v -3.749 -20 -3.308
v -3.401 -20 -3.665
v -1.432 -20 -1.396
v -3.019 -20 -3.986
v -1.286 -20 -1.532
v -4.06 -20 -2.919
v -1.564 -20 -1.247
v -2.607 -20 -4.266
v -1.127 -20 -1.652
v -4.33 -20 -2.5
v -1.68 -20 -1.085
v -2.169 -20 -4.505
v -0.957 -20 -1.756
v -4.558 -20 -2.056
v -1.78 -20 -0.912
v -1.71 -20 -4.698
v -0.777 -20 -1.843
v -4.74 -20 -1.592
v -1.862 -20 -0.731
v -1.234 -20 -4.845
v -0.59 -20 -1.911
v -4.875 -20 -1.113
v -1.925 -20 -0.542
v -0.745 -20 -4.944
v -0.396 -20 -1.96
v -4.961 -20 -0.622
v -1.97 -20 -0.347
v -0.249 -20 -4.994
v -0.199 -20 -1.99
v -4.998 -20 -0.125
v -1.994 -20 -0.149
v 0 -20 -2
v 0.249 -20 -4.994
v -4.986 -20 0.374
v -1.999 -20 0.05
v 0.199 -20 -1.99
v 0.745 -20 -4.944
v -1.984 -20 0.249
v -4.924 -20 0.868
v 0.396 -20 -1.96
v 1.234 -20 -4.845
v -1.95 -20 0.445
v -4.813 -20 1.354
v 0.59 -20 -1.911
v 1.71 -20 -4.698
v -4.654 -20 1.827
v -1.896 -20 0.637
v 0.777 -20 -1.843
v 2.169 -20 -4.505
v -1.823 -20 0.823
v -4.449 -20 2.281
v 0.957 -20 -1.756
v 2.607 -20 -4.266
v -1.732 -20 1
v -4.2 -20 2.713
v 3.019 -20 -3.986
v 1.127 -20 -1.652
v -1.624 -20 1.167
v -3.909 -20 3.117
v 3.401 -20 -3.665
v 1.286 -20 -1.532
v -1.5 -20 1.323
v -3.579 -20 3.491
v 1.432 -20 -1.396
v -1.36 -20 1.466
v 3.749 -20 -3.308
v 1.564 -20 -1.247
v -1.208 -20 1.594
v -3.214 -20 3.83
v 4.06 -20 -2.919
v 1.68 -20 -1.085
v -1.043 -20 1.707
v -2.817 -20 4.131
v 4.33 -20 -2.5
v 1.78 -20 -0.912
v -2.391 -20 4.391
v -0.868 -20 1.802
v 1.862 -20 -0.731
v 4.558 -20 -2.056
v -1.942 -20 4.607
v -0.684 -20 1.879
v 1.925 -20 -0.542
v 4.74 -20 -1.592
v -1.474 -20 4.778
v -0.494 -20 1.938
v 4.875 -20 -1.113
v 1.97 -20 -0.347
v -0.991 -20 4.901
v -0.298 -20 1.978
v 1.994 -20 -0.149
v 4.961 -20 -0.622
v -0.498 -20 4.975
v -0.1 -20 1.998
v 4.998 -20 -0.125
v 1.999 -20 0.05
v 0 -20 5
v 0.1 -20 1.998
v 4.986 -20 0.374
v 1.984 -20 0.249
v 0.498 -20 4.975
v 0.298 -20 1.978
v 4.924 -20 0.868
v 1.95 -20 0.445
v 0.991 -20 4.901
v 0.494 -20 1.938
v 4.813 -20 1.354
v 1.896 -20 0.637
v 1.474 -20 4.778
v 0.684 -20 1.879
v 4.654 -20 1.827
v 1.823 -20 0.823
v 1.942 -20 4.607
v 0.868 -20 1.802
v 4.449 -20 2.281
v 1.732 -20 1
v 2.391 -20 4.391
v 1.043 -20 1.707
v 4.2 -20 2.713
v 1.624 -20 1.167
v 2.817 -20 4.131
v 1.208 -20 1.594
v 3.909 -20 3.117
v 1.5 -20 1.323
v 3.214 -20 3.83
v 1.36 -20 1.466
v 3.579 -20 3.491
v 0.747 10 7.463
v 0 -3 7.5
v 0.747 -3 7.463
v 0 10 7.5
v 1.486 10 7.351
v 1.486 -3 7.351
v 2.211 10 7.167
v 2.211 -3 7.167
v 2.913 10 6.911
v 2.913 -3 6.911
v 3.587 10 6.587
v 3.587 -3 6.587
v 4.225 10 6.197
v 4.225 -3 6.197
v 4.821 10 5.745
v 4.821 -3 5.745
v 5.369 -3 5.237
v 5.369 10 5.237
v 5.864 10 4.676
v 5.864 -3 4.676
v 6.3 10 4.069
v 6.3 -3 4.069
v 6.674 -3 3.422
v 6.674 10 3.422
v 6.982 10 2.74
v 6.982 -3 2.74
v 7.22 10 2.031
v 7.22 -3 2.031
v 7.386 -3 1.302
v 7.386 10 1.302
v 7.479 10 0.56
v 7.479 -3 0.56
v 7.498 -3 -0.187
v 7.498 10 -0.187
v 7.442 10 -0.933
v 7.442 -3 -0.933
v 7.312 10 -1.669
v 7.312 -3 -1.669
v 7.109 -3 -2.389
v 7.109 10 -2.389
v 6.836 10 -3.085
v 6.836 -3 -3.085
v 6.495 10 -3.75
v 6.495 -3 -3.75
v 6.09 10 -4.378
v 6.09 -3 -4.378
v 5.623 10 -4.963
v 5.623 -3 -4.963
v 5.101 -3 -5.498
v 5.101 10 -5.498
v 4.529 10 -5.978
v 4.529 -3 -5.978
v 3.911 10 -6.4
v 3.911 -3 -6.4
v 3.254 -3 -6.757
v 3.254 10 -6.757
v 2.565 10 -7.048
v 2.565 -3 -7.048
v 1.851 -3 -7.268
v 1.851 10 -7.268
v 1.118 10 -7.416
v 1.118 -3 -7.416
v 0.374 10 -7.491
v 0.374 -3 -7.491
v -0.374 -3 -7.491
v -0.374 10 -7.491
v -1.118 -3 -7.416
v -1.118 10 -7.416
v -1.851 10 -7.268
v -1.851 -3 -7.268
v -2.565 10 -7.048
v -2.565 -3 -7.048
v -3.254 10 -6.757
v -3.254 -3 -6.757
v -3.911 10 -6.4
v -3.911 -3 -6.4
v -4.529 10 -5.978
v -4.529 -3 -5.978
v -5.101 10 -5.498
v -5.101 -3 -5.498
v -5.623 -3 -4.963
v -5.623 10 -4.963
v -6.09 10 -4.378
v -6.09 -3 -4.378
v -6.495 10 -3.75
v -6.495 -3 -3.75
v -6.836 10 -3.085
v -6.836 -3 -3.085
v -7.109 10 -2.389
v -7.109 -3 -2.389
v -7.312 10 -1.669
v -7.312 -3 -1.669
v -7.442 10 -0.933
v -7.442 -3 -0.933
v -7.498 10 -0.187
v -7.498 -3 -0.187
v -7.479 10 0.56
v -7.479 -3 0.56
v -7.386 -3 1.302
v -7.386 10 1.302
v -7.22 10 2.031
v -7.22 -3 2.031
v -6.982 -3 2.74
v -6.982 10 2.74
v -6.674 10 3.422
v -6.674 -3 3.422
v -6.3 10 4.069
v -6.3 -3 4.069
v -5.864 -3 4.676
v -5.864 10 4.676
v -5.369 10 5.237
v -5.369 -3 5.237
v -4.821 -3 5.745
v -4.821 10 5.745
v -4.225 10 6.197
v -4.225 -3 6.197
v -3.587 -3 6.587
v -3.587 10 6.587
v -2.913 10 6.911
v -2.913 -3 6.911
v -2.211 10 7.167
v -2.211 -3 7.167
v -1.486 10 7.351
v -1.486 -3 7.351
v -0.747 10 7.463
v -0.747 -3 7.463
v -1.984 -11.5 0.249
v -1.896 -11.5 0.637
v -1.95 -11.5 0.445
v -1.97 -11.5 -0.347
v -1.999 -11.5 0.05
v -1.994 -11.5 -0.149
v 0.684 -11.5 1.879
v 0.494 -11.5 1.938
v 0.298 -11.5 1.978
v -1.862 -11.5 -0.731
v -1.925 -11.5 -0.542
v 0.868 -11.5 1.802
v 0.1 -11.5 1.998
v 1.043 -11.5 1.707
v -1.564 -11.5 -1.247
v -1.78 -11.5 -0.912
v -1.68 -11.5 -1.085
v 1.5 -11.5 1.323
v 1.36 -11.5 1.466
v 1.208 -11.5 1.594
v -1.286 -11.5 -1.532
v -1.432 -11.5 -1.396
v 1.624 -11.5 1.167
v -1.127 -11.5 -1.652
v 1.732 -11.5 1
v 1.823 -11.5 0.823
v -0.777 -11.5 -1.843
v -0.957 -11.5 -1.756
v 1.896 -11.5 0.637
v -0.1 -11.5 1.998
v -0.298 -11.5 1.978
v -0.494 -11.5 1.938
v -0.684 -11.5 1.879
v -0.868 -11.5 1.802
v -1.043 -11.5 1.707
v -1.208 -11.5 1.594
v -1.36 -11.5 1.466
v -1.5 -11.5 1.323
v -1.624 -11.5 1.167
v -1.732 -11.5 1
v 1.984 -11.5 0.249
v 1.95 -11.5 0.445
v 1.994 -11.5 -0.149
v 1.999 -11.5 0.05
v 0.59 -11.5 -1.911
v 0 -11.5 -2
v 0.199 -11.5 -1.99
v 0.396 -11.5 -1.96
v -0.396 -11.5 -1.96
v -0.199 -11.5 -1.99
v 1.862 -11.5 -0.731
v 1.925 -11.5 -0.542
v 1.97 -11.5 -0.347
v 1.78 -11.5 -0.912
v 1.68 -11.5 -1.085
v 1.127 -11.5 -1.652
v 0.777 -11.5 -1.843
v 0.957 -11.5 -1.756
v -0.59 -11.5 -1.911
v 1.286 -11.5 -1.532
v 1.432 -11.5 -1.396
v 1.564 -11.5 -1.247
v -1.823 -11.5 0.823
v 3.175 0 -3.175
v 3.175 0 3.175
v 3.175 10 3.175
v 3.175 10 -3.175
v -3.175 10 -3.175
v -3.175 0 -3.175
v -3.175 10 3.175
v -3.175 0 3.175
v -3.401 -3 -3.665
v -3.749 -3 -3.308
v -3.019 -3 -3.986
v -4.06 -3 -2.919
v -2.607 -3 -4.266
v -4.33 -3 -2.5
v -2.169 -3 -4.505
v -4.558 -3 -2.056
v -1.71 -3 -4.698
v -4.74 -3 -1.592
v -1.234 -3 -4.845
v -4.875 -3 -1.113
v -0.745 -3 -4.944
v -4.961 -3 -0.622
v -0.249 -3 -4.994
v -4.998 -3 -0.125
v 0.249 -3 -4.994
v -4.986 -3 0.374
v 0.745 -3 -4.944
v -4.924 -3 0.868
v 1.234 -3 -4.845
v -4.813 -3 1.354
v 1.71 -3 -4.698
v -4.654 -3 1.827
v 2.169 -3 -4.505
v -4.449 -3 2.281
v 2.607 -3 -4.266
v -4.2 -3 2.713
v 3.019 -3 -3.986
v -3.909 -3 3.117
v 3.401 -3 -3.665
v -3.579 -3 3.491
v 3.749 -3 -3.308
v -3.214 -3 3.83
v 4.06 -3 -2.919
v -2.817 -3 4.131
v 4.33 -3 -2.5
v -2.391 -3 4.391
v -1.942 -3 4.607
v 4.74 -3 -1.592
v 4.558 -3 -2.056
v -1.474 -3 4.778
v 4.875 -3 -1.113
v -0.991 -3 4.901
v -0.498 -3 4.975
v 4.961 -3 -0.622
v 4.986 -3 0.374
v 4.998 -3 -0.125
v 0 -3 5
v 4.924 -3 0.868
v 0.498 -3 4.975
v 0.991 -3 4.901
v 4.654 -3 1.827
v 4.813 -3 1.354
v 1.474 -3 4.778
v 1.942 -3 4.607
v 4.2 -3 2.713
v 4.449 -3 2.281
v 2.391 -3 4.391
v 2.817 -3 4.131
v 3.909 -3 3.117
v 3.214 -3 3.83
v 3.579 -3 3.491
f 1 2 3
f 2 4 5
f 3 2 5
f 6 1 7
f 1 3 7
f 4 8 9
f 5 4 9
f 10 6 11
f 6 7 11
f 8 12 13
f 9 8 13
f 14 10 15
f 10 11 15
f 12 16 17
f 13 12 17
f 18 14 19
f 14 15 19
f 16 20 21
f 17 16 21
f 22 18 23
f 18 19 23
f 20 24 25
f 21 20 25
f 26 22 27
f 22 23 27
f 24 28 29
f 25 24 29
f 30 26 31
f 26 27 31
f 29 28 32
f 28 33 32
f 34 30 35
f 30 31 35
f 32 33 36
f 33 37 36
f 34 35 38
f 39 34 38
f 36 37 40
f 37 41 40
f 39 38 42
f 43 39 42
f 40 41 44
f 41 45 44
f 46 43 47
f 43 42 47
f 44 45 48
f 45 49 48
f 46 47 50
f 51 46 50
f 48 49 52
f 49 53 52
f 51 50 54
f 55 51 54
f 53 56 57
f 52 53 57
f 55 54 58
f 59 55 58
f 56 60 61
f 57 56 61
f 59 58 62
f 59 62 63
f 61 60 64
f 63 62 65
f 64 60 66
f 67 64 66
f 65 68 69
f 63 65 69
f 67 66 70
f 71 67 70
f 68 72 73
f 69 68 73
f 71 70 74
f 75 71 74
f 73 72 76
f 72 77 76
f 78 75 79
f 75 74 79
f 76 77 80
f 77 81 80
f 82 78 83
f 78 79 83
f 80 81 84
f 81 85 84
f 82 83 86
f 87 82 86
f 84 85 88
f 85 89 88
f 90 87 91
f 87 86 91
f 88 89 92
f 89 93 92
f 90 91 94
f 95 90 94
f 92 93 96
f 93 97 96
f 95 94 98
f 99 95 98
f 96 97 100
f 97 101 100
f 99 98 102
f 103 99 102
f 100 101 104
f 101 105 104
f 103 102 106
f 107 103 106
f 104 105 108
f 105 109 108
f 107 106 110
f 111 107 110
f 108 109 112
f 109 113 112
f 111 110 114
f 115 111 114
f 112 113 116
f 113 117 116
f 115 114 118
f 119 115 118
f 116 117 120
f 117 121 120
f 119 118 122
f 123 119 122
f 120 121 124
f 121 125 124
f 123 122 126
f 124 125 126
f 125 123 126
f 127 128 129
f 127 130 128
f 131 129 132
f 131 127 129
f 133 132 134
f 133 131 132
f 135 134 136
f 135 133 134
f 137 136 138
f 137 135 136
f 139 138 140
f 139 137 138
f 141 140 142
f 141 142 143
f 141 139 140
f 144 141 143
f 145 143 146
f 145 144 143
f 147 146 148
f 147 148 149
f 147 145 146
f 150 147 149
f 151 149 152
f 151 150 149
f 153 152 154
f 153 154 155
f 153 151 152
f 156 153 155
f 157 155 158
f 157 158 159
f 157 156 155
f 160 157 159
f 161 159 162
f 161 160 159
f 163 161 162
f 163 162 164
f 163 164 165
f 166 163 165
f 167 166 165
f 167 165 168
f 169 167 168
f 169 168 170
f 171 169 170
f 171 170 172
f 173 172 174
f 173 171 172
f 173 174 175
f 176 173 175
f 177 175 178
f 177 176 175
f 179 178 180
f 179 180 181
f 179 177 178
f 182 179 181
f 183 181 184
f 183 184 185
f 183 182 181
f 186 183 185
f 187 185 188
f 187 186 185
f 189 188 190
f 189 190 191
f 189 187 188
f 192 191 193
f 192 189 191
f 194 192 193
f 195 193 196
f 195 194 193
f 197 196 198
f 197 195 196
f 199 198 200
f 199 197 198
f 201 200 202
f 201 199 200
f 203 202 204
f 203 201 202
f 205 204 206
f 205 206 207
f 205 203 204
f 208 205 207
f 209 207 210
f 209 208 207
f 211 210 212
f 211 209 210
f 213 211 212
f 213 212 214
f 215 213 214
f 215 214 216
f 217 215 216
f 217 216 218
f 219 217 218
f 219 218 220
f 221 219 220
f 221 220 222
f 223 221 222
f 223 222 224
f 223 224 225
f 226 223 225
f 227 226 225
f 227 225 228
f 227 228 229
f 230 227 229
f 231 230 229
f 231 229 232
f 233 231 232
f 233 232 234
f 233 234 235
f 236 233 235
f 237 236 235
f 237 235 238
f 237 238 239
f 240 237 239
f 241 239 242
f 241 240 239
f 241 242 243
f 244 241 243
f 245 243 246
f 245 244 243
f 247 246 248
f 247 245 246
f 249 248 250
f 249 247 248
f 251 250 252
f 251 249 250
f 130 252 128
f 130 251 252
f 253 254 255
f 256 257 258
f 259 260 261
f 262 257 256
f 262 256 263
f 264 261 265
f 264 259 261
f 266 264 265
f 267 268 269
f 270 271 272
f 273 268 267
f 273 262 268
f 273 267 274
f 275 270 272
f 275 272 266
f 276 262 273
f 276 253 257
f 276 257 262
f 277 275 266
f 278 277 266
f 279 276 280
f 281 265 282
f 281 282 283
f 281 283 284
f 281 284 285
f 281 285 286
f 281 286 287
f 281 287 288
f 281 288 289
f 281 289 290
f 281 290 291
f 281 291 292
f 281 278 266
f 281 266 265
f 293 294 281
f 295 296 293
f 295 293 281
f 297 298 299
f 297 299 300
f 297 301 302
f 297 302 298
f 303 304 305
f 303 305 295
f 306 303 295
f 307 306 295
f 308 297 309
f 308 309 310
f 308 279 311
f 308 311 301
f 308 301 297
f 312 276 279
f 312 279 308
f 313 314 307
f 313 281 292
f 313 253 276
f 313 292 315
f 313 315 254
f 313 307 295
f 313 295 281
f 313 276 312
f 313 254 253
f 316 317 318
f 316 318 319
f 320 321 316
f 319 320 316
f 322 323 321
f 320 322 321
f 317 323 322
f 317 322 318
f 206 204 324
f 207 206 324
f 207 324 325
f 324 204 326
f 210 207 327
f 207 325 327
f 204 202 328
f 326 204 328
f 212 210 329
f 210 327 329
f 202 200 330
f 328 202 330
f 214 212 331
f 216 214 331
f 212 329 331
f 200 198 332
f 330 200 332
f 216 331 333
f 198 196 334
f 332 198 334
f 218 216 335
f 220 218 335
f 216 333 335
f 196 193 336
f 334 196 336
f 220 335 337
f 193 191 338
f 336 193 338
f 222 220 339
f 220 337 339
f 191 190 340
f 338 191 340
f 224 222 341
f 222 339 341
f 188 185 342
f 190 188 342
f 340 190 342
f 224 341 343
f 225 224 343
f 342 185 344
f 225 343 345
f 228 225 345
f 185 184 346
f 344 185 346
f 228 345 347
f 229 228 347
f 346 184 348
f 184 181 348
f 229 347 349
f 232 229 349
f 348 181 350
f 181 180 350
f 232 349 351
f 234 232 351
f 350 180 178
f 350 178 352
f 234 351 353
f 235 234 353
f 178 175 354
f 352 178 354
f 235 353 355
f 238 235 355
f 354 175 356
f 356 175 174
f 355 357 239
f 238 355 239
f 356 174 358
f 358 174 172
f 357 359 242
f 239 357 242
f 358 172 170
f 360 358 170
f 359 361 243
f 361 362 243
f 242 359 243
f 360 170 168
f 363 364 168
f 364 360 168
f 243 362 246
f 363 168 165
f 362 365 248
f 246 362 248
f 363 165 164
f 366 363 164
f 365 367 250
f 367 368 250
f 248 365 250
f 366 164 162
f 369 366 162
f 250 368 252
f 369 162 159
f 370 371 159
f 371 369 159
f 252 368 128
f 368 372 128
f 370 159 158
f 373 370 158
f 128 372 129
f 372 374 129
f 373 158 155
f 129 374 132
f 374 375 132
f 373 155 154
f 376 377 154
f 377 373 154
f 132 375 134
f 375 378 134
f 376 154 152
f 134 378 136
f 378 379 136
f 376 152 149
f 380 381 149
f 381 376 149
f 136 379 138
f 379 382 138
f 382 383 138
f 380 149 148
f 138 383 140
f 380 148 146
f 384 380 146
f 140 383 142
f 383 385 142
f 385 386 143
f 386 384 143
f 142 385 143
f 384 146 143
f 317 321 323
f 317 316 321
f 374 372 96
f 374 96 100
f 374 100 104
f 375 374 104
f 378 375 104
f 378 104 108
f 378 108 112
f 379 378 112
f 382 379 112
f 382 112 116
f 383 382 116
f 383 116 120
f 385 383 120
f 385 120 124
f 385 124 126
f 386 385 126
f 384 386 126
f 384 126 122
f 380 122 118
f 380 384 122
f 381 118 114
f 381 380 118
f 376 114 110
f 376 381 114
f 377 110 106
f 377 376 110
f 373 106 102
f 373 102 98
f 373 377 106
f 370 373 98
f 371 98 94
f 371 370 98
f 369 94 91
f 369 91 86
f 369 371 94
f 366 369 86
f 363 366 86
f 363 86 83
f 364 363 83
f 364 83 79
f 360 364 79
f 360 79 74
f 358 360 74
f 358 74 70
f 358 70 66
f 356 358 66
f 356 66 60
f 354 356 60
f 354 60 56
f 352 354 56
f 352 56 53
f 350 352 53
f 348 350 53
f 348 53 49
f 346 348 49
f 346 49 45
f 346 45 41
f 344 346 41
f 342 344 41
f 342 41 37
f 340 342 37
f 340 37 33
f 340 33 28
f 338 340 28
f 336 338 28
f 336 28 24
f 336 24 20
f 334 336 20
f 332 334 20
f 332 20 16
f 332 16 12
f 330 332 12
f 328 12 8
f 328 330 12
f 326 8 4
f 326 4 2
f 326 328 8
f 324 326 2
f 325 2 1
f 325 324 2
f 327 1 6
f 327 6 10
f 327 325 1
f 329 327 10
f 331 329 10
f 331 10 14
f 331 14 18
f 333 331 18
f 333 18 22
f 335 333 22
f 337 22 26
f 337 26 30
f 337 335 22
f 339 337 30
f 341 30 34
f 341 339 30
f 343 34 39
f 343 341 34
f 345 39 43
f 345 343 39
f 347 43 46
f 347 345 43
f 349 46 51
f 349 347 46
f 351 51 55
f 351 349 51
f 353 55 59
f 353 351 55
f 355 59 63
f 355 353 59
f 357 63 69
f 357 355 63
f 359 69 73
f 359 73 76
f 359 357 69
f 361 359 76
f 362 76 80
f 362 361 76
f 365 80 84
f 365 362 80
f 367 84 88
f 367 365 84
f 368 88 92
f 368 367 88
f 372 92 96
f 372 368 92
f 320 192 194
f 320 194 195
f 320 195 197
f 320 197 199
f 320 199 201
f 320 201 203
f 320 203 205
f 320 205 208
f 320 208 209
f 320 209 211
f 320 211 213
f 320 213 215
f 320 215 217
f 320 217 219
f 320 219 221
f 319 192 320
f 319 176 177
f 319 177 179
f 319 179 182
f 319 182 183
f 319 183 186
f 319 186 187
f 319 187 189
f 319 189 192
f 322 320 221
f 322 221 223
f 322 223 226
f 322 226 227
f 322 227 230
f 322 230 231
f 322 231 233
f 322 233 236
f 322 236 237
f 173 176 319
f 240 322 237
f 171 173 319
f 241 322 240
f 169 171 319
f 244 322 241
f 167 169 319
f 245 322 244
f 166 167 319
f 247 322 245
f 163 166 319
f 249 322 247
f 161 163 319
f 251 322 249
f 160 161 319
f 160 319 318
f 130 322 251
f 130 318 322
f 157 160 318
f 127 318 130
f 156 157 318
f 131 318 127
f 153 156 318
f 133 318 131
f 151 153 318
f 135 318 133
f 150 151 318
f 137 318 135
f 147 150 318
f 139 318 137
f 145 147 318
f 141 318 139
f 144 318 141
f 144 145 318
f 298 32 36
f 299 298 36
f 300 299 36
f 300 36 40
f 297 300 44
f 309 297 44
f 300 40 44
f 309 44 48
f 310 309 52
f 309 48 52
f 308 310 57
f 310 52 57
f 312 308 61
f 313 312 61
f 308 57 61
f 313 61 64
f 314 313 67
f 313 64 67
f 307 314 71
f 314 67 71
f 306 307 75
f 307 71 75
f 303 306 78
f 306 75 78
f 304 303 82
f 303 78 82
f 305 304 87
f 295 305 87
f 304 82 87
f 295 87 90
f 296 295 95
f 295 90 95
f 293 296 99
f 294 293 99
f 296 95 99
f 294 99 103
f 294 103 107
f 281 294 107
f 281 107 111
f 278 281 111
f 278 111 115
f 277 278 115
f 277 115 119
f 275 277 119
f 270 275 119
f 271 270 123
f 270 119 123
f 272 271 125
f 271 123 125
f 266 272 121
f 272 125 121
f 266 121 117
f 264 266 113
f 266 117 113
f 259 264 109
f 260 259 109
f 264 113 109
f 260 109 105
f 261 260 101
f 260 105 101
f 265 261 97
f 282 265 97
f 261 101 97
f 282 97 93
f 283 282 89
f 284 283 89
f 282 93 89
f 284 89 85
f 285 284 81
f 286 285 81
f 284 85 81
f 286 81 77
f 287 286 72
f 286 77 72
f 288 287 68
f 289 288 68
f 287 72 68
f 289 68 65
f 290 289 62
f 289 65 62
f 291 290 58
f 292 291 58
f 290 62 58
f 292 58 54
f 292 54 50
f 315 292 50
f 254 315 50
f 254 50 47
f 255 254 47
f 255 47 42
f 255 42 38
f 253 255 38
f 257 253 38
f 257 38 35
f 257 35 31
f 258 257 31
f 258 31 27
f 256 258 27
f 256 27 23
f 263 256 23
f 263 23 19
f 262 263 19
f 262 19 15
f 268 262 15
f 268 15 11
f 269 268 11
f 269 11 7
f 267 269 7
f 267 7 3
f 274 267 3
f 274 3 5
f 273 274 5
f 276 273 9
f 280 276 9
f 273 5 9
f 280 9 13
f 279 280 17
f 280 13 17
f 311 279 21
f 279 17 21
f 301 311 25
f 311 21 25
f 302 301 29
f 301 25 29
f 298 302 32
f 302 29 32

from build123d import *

# Parameters (mm, degrees)
SKETCH2_R           = 7.5
SKETCH2_R_2         = 5
SKETCH2_W           = 6.35
SKETCH2_H           = 6.35
BOSS_EXTRUDE1_DEPTH = 10
SKETCH2_4_R         = 5
BOSS_EXTRUDE2_DEPTH = 20
SKETCH2_5_R         = 7.5
SKETCH2_5_R_2       = 5
BOSS_EXTRUDE3_DEPTH = 3
SKETCH3_R           = 2
CUT_EXTRUDE1_DEPTH  = 8.5


with BuildPart() as part:
    # Sketch2 → Boss-Extrude1 (new body)
    with BuildSketch(Plane(origin=(0, 0, 0), x_dir=(1, 0, 0), z_dir=(0, 1, 0))):
        with Locations(Location((0, 0, 0), (0, 0, 270))):
            Circle(SKETCH2_R)
        Circle(SKETCH2_R_2, mode=Mode.SUBTRACT)
        Circle(SKETCH2_R_2)
        Rectangle(SKETCH2_W, SKETCH2_H, mode=Mode.SUBTRACT)
    extrude(amount=BOSS_EXTRUDE1_DEPTH)

    # Sketch2<4> → Boss-Extrude2 (add)
    with BuildSketch(Plane(origin=(0, 0, 0), x_dir=(1, 0, 0), z_dir=(0, 1, 0))):
        with Locations(Location((0, 0, 0), (0, 0, 270))):
            Circle(SKETCH2_4_R)
    extrude(amount=-BOSS_EXTRUDE2_DEPTH)

    # Sketch2<5> → Boss-Extrude3 (add)
    with BuildSketch(Plane(origin=(0, 0, 0), x_dir=(1, 0, 0), z_dir=(0, 1, 0))):
        with Locations(Location((0, 0, 0), (0, 0, 270))):
            Circle(SKETCH2_5_R)
        with Locations(Location((0, 0, 0), (0, 0, 270))):
            Circle(SKETCH2_5_R_2, mode=Mode.SUBTRACT)
    extrude(amount=-BOSS_EXTRUDE3_DEPTH)

    # Sketch3 → Cut-Extrude1 (cut)
    with BuildSketch(Plane.XZ.offset(20)):
        with Locations(Location((0, 0, 0), (0, 0, 270))):
            Circle(SKETCH3_R)
    extrude(amount=-CUT_EXTRUDE1_DEPTH, mode=Mode.SUBTRACT)


solid = part.part
